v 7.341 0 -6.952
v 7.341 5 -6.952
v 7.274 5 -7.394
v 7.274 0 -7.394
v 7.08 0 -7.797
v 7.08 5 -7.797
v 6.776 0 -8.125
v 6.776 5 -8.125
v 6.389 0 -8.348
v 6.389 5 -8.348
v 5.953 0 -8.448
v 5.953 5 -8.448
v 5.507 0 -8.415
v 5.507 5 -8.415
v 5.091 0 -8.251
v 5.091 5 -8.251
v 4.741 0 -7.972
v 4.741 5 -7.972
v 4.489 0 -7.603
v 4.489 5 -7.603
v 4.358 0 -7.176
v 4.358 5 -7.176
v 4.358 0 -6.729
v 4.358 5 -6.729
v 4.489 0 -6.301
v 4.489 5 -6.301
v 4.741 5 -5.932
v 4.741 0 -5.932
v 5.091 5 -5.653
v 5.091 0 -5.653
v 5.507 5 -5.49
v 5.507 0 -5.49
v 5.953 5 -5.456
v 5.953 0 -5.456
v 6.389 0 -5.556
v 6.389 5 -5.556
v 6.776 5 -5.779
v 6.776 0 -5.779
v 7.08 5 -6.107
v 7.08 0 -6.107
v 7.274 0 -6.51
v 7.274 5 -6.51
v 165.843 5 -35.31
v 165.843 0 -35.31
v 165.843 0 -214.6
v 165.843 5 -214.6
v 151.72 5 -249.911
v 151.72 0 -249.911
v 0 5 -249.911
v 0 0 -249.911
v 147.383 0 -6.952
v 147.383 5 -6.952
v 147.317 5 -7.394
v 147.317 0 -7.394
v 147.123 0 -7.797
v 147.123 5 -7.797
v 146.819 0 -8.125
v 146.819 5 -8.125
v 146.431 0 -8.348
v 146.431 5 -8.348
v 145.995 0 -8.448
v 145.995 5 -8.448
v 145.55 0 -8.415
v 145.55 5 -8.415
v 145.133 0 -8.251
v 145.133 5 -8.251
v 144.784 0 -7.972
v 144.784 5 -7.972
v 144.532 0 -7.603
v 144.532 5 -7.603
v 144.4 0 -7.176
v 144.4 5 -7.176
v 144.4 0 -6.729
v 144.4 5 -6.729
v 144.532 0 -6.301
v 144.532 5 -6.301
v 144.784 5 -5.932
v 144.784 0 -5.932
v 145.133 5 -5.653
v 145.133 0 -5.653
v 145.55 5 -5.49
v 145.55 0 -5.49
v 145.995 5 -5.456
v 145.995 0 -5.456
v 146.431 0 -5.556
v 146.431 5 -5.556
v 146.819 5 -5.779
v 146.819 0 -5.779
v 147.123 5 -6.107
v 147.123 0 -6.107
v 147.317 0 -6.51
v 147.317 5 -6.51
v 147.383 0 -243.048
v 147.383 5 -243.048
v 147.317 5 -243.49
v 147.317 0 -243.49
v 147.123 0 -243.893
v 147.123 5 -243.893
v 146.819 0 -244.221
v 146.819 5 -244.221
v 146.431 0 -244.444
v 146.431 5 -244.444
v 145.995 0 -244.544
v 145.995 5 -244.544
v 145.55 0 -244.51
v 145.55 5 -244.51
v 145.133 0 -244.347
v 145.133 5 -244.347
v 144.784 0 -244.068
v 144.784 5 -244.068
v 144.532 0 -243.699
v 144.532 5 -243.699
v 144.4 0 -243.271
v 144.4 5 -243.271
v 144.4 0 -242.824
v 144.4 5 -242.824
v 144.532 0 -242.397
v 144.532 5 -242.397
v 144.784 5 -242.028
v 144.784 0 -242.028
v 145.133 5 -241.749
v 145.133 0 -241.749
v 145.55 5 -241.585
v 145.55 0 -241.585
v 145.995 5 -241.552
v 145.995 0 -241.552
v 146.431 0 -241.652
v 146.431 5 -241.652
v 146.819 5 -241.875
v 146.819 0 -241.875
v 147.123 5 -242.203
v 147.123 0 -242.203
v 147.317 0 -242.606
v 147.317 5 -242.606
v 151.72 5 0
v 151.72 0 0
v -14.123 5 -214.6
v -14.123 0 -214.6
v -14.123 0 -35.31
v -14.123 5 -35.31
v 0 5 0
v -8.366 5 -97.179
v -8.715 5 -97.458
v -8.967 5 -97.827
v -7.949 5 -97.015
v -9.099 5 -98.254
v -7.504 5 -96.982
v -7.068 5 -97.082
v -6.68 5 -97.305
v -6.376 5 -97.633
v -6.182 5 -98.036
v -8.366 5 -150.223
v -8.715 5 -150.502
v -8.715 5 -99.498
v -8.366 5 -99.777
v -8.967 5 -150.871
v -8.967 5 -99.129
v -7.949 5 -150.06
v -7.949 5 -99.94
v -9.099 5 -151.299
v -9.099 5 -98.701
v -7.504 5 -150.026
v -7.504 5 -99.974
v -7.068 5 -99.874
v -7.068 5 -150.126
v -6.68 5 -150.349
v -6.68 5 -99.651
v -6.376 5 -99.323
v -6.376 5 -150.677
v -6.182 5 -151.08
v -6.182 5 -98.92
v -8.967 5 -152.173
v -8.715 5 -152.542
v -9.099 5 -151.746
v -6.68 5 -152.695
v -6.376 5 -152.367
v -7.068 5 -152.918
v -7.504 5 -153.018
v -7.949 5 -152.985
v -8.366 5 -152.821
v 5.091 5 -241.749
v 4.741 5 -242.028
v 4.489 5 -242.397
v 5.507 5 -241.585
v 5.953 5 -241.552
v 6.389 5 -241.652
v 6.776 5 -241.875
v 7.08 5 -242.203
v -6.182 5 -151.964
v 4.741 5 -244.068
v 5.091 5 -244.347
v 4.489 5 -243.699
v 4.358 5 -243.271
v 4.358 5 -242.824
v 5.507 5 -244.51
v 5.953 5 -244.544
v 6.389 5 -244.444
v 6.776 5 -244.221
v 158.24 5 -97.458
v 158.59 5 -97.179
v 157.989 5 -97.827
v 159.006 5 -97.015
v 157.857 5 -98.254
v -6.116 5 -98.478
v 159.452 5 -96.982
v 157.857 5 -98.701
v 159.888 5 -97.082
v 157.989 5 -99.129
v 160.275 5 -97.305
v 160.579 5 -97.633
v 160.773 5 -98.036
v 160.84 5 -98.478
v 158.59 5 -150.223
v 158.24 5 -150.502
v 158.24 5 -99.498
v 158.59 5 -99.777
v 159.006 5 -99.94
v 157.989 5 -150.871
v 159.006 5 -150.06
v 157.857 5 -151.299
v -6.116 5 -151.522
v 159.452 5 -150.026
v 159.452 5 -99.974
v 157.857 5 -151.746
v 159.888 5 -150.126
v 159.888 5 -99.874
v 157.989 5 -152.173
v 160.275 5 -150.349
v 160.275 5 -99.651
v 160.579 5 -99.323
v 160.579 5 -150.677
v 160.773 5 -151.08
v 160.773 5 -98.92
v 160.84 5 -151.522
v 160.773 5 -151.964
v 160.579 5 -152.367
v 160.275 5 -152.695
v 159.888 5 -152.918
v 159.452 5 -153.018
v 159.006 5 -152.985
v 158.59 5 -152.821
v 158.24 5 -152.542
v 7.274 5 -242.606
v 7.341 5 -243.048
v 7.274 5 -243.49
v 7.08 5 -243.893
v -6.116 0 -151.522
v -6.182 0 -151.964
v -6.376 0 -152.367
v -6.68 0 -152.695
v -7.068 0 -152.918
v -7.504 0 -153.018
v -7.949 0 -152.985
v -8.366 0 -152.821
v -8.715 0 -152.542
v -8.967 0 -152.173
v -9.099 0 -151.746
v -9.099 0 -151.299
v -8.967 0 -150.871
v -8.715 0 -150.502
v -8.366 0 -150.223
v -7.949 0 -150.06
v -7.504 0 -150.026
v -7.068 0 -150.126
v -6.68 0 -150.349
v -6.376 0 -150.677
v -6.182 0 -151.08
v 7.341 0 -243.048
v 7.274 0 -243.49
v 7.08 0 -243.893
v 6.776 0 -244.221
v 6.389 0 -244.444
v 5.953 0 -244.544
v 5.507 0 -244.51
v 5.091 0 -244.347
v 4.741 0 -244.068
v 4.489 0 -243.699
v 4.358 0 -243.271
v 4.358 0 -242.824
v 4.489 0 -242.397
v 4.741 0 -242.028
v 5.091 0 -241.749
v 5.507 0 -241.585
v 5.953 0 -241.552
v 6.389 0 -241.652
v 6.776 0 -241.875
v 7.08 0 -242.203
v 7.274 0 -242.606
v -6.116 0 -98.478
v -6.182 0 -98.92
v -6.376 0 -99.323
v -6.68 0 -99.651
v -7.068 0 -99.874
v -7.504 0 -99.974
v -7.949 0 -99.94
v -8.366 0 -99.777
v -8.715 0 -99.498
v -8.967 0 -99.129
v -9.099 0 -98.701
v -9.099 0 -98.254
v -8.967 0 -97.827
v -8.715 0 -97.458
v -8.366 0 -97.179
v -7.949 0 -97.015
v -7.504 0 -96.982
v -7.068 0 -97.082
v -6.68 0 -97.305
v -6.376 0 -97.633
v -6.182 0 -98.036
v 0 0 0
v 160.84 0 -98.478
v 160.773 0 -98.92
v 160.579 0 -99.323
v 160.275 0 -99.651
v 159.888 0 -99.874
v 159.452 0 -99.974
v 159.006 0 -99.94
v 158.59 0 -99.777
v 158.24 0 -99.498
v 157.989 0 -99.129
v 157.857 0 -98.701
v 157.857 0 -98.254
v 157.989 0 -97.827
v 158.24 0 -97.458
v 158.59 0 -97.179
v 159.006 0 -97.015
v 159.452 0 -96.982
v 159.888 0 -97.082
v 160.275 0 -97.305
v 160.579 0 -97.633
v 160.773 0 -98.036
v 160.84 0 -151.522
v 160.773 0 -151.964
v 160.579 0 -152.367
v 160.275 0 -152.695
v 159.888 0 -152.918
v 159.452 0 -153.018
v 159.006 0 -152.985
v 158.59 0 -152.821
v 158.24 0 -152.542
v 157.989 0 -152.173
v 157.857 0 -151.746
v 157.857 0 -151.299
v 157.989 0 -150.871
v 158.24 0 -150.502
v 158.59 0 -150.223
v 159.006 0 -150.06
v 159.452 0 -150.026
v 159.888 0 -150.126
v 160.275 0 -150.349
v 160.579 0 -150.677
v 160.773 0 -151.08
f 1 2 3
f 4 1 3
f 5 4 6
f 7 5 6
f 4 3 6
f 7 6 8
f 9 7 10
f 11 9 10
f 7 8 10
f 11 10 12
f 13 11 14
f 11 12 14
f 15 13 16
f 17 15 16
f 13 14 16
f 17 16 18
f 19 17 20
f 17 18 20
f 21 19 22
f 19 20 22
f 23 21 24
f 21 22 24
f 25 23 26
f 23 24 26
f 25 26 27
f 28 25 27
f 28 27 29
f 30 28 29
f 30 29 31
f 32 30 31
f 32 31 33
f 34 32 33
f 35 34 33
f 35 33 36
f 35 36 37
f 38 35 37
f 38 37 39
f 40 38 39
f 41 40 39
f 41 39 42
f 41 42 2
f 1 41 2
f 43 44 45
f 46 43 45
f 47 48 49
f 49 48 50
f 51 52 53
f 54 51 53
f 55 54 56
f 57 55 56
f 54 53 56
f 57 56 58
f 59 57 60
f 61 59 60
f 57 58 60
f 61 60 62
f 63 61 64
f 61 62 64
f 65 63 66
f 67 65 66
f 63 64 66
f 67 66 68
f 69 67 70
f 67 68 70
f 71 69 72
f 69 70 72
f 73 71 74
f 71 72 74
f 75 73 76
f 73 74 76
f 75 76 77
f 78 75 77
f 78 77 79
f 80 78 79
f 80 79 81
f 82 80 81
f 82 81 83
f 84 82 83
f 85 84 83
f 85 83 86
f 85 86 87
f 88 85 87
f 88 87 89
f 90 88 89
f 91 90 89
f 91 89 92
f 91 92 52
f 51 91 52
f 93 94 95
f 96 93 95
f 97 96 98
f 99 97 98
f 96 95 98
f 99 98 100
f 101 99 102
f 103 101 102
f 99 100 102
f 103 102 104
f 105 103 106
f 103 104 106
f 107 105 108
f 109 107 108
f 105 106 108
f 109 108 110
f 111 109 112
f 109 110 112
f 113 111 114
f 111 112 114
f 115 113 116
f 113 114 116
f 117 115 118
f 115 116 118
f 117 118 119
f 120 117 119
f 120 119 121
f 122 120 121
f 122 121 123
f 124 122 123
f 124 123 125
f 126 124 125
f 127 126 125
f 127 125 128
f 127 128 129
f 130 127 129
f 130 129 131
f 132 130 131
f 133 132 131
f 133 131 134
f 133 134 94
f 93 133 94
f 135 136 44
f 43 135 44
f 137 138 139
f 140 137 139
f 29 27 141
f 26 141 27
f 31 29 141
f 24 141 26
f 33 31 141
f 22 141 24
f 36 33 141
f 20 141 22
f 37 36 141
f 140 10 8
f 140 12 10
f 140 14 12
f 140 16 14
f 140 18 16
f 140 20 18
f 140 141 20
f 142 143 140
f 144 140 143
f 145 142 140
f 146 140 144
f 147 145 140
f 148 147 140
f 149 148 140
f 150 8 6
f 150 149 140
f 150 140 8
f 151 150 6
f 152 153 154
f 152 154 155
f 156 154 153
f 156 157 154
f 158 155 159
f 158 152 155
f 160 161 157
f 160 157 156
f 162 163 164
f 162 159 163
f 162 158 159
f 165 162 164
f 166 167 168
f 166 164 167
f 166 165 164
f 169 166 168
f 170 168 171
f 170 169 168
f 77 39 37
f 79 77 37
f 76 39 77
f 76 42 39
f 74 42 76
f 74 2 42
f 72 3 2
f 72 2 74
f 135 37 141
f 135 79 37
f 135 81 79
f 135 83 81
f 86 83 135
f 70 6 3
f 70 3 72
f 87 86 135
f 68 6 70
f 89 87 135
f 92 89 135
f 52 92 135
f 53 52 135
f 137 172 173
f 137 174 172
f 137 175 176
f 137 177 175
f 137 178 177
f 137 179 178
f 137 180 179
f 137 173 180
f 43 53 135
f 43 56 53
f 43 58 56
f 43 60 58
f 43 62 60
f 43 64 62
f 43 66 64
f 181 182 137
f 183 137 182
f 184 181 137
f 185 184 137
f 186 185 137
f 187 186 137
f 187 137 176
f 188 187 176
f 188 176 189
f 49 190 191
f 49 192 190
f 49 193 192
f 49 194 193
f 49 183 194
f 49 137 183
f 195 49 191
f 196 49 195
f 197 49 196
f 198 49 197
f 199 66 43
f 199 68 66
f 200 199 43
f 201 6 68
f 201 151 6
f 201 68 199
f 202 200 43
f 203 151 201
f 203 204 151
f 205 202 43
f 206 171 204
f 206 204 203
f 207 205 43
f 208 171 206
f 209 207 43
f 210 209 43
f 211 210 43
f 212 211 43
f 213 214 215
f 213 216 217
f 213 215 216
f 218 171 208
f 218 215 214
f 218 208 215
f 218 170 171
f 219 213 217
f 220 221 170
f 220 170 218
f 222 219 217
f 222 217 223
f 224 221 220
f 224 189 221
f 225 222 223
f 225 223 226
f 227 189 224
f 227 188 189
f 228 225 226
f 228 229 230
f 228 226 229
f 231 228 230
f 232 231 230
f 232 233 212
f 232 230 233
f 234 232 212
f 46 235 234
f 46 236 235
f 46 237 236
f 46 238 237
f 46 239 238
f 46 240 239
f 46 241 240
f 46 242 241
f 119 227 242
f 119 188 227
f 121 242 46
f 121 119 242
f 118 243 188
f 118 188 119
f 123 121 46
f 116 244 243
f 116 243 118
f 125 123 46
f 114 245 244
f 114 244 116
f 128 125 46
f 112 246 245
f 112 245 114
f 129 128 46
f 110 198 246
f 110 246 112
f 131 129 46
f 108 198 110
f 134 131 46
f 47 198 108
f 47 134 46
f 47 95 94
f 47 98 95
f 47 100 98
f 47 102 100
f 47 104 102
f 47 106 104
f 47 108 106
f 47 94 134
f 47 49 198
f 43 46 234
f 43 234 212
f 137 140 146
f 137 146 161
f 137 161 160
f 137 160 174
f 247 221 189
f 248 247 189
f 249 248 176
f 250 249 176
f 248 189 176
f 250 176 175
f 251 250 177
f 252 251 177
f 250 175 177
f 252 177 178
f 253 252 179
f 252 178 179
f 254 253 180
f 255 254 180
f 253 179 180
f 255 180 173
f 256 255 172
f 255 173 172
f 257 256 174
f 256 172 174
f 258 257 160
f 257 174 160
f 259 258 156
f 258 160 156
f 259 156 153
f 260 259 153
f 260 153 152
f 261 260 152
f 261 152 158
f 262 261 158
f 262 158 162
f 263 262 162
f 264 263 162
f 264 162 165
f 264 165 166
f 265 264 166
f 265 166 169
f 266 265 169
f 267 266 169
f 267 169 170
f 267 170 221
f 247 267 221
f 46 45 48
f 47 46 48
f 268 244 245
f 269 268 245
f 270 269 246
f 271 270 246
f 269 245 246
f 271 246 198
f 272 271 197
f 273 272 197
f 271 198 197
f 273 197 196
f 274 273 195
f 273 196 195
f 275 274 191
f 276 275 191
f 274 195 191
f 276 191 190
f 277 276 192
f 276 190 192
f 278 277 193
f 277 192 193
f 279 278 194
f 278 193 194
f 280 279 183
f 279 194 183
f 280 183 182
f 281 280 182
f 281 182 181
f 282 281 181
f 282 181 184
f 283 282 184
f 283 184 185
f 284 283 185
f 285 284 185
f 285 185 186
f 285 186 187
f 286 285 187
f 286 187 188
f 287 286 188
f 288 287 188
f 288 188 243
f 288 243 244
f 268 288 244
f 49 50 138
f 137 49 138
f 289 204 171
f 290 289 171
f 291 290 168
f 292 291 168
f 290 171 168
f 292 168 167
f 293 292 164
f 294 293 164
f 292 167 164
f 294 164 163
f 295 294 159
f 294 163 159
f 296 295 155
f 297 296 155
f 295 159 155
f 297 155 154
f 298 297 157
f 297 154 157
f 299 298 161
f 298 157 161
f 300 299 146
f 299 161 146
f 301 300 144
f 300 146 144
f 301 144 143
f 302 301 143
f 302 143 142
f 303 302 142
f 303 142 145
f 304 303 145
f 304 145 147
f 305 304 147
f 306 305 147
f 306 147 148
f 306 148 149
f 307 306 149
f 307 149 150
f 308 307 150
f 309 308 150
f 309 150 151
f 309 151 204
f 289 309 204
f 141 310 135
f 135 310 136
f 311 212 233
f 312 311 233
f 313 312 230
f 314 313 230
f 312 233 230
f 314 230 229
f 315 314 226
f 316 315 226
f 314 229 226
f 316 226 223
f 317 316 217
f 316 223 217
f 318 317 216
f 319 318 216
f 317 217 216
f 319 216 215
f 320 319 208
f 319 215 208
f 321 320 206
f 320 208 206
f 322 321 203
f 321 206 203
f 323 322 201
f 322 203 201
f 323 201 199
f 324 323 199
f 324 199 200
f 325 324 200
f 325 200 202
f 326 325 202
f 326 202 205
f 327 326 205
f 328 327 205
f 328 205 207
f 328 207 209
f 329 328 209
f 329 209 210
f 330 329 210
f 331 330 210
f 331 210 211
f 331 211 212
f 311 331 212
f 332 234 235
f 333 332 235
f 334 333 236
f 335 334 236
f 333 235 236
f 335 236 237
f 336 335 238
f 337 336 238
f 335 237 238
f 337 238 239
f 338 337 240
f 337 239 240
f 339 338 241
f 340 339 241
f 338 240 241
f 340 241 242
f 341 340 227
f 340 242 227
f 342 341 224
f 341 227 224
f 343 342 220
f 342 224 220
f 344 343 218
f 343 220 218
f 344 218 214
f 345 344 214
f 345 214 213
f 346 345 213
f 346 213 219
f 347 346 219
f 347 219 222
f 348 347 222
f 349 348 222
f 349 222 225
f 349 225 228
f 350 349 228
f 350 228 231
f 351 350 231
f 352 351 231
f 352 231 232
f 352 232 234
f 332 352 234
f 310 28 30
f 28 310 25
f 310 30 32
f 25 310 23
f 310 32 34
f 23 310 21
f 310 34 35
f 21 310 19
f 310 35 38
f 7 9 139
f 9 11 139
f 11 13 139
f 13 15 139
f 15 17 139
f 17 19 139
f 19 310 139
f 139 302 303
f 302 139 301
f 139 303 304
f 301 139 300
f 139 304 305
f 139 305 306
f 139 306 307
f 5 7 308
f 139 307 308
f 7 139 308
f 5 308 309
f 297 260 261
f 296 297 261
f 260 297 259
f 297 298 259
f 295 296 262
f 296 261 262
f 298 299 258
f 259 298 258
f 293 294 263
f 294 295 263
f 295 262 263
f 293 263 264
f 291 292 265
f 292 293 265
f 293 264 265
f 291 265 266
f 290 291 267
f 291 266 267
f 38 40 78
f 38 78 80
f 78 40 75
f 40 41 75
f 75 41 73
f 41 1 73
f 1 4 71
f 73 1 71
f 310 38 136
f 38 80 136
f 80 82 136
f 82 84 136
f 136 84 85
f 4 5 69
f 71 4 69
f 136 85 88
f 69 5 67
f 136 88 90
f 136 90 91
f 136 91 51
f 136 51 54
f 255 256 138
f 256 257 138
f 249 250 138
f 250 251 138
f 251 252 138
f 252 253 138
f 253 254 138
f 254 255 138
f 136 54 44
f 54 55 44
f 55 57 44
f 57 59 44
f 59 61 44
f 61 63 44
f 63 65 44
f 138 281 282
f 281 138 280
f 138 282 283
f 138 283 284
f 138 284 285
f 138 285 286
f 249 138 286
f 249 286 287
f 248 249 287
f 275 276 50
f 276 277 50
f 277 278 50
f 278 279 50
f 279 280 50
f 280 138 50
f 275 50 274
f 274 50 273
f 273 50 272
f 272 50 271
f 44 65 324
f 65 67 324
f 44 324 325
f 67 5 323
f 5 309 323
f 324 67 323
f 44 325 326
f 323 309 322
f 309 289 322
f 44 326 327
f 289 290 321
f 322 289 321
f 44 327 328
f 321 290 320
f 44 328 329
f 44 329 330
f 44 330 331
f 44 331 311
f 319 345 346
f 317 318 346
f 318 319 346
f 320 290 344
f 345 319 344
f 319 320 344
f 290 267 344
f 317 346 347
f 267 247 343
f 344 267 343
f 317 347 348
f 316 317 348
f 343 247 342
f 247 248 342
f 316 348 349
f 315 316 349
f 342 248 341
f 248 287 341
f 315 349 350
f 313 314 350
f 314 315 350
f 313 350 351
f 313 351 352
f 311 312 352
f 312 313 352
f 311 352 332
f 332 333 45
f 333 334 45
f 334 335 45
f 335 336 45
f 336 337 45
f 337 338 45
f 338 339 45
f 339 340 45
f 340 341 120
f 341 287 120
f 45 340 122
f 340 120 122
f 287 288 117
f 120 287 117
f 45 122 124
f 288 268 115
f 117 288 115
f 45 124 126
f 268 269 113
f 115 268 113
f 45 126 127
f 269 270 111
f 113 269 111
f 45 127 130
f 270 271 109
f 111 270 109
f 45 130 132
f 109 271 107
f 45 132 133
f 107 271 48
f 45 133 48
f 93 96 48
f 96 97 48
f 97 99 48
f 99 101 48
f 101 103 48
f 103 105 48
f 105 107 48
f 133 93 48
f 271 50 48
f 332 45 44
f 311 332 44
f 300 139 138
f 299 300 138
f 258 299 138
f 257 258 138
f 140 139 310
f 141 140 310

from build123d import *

# Parameters (mm, degrees)
BOSS_EXTRUDE1_DEPTH = 5
SKETCH2_R           = 1.5
CUT_EXTRUDE1_DEPTH  = 10


with BuildPart() as part:
    # Sketch1 → Boss-Extrude1 (new body)
    with BuildSketch(Plane(origin=(0, 0, 0), x_dir=(1, 0, 0), z_dir=(0, 1, 0))):
        Polygon((0, 0), (151.72, 0), (165.843118786, 35.310315996), (165.843118786, 214.600315996), (151.72, 249.910631993), (0, 249.910631993), (-14.123118786, 214.600315996), (-14.123118786, 35.310315996), align=None)
    extrude(amount=BOSS_EXTRUDE1_DEPTH)

    # Sketch2 → Cut-Extrude1 (cut)
    with BuildSketch(Plane(origin=(0, 5, 0), x_dir=(1, 0, 0), z_dir=(0, 1, 0))):
        with Locations((159.339988978, 98.477853355)):
            Circle(SKETCH2_R)
        with Locations((145.883373815, 6.952127765)):
            Circle(SKETCH2_R)
        with Locations((5.840897433, 6.952127765)):
            Circle(SKETCH2_R)
        with Locations((-7.615717731, 98.477853355)):
            Circle(SKETCH2_R)
        with Locations((-7.615717731, 151.522146645)):
            Circle(SKETCH2_R)
        with Locations((5.840897433, 243.047872235)):
            Circle(SKETCH2_R)
        with Locations((145.883373815, 243.047872235)):
            Circle(SKETCH2_R)
        with Locations((159.339988978, 151.522146645)):
            Circle(SKETCH2_R)
    extrude(amount=-CUT_EXTRUDE1_DEPTH, mode=Mode.SUBTRACT)


solid = part.part
